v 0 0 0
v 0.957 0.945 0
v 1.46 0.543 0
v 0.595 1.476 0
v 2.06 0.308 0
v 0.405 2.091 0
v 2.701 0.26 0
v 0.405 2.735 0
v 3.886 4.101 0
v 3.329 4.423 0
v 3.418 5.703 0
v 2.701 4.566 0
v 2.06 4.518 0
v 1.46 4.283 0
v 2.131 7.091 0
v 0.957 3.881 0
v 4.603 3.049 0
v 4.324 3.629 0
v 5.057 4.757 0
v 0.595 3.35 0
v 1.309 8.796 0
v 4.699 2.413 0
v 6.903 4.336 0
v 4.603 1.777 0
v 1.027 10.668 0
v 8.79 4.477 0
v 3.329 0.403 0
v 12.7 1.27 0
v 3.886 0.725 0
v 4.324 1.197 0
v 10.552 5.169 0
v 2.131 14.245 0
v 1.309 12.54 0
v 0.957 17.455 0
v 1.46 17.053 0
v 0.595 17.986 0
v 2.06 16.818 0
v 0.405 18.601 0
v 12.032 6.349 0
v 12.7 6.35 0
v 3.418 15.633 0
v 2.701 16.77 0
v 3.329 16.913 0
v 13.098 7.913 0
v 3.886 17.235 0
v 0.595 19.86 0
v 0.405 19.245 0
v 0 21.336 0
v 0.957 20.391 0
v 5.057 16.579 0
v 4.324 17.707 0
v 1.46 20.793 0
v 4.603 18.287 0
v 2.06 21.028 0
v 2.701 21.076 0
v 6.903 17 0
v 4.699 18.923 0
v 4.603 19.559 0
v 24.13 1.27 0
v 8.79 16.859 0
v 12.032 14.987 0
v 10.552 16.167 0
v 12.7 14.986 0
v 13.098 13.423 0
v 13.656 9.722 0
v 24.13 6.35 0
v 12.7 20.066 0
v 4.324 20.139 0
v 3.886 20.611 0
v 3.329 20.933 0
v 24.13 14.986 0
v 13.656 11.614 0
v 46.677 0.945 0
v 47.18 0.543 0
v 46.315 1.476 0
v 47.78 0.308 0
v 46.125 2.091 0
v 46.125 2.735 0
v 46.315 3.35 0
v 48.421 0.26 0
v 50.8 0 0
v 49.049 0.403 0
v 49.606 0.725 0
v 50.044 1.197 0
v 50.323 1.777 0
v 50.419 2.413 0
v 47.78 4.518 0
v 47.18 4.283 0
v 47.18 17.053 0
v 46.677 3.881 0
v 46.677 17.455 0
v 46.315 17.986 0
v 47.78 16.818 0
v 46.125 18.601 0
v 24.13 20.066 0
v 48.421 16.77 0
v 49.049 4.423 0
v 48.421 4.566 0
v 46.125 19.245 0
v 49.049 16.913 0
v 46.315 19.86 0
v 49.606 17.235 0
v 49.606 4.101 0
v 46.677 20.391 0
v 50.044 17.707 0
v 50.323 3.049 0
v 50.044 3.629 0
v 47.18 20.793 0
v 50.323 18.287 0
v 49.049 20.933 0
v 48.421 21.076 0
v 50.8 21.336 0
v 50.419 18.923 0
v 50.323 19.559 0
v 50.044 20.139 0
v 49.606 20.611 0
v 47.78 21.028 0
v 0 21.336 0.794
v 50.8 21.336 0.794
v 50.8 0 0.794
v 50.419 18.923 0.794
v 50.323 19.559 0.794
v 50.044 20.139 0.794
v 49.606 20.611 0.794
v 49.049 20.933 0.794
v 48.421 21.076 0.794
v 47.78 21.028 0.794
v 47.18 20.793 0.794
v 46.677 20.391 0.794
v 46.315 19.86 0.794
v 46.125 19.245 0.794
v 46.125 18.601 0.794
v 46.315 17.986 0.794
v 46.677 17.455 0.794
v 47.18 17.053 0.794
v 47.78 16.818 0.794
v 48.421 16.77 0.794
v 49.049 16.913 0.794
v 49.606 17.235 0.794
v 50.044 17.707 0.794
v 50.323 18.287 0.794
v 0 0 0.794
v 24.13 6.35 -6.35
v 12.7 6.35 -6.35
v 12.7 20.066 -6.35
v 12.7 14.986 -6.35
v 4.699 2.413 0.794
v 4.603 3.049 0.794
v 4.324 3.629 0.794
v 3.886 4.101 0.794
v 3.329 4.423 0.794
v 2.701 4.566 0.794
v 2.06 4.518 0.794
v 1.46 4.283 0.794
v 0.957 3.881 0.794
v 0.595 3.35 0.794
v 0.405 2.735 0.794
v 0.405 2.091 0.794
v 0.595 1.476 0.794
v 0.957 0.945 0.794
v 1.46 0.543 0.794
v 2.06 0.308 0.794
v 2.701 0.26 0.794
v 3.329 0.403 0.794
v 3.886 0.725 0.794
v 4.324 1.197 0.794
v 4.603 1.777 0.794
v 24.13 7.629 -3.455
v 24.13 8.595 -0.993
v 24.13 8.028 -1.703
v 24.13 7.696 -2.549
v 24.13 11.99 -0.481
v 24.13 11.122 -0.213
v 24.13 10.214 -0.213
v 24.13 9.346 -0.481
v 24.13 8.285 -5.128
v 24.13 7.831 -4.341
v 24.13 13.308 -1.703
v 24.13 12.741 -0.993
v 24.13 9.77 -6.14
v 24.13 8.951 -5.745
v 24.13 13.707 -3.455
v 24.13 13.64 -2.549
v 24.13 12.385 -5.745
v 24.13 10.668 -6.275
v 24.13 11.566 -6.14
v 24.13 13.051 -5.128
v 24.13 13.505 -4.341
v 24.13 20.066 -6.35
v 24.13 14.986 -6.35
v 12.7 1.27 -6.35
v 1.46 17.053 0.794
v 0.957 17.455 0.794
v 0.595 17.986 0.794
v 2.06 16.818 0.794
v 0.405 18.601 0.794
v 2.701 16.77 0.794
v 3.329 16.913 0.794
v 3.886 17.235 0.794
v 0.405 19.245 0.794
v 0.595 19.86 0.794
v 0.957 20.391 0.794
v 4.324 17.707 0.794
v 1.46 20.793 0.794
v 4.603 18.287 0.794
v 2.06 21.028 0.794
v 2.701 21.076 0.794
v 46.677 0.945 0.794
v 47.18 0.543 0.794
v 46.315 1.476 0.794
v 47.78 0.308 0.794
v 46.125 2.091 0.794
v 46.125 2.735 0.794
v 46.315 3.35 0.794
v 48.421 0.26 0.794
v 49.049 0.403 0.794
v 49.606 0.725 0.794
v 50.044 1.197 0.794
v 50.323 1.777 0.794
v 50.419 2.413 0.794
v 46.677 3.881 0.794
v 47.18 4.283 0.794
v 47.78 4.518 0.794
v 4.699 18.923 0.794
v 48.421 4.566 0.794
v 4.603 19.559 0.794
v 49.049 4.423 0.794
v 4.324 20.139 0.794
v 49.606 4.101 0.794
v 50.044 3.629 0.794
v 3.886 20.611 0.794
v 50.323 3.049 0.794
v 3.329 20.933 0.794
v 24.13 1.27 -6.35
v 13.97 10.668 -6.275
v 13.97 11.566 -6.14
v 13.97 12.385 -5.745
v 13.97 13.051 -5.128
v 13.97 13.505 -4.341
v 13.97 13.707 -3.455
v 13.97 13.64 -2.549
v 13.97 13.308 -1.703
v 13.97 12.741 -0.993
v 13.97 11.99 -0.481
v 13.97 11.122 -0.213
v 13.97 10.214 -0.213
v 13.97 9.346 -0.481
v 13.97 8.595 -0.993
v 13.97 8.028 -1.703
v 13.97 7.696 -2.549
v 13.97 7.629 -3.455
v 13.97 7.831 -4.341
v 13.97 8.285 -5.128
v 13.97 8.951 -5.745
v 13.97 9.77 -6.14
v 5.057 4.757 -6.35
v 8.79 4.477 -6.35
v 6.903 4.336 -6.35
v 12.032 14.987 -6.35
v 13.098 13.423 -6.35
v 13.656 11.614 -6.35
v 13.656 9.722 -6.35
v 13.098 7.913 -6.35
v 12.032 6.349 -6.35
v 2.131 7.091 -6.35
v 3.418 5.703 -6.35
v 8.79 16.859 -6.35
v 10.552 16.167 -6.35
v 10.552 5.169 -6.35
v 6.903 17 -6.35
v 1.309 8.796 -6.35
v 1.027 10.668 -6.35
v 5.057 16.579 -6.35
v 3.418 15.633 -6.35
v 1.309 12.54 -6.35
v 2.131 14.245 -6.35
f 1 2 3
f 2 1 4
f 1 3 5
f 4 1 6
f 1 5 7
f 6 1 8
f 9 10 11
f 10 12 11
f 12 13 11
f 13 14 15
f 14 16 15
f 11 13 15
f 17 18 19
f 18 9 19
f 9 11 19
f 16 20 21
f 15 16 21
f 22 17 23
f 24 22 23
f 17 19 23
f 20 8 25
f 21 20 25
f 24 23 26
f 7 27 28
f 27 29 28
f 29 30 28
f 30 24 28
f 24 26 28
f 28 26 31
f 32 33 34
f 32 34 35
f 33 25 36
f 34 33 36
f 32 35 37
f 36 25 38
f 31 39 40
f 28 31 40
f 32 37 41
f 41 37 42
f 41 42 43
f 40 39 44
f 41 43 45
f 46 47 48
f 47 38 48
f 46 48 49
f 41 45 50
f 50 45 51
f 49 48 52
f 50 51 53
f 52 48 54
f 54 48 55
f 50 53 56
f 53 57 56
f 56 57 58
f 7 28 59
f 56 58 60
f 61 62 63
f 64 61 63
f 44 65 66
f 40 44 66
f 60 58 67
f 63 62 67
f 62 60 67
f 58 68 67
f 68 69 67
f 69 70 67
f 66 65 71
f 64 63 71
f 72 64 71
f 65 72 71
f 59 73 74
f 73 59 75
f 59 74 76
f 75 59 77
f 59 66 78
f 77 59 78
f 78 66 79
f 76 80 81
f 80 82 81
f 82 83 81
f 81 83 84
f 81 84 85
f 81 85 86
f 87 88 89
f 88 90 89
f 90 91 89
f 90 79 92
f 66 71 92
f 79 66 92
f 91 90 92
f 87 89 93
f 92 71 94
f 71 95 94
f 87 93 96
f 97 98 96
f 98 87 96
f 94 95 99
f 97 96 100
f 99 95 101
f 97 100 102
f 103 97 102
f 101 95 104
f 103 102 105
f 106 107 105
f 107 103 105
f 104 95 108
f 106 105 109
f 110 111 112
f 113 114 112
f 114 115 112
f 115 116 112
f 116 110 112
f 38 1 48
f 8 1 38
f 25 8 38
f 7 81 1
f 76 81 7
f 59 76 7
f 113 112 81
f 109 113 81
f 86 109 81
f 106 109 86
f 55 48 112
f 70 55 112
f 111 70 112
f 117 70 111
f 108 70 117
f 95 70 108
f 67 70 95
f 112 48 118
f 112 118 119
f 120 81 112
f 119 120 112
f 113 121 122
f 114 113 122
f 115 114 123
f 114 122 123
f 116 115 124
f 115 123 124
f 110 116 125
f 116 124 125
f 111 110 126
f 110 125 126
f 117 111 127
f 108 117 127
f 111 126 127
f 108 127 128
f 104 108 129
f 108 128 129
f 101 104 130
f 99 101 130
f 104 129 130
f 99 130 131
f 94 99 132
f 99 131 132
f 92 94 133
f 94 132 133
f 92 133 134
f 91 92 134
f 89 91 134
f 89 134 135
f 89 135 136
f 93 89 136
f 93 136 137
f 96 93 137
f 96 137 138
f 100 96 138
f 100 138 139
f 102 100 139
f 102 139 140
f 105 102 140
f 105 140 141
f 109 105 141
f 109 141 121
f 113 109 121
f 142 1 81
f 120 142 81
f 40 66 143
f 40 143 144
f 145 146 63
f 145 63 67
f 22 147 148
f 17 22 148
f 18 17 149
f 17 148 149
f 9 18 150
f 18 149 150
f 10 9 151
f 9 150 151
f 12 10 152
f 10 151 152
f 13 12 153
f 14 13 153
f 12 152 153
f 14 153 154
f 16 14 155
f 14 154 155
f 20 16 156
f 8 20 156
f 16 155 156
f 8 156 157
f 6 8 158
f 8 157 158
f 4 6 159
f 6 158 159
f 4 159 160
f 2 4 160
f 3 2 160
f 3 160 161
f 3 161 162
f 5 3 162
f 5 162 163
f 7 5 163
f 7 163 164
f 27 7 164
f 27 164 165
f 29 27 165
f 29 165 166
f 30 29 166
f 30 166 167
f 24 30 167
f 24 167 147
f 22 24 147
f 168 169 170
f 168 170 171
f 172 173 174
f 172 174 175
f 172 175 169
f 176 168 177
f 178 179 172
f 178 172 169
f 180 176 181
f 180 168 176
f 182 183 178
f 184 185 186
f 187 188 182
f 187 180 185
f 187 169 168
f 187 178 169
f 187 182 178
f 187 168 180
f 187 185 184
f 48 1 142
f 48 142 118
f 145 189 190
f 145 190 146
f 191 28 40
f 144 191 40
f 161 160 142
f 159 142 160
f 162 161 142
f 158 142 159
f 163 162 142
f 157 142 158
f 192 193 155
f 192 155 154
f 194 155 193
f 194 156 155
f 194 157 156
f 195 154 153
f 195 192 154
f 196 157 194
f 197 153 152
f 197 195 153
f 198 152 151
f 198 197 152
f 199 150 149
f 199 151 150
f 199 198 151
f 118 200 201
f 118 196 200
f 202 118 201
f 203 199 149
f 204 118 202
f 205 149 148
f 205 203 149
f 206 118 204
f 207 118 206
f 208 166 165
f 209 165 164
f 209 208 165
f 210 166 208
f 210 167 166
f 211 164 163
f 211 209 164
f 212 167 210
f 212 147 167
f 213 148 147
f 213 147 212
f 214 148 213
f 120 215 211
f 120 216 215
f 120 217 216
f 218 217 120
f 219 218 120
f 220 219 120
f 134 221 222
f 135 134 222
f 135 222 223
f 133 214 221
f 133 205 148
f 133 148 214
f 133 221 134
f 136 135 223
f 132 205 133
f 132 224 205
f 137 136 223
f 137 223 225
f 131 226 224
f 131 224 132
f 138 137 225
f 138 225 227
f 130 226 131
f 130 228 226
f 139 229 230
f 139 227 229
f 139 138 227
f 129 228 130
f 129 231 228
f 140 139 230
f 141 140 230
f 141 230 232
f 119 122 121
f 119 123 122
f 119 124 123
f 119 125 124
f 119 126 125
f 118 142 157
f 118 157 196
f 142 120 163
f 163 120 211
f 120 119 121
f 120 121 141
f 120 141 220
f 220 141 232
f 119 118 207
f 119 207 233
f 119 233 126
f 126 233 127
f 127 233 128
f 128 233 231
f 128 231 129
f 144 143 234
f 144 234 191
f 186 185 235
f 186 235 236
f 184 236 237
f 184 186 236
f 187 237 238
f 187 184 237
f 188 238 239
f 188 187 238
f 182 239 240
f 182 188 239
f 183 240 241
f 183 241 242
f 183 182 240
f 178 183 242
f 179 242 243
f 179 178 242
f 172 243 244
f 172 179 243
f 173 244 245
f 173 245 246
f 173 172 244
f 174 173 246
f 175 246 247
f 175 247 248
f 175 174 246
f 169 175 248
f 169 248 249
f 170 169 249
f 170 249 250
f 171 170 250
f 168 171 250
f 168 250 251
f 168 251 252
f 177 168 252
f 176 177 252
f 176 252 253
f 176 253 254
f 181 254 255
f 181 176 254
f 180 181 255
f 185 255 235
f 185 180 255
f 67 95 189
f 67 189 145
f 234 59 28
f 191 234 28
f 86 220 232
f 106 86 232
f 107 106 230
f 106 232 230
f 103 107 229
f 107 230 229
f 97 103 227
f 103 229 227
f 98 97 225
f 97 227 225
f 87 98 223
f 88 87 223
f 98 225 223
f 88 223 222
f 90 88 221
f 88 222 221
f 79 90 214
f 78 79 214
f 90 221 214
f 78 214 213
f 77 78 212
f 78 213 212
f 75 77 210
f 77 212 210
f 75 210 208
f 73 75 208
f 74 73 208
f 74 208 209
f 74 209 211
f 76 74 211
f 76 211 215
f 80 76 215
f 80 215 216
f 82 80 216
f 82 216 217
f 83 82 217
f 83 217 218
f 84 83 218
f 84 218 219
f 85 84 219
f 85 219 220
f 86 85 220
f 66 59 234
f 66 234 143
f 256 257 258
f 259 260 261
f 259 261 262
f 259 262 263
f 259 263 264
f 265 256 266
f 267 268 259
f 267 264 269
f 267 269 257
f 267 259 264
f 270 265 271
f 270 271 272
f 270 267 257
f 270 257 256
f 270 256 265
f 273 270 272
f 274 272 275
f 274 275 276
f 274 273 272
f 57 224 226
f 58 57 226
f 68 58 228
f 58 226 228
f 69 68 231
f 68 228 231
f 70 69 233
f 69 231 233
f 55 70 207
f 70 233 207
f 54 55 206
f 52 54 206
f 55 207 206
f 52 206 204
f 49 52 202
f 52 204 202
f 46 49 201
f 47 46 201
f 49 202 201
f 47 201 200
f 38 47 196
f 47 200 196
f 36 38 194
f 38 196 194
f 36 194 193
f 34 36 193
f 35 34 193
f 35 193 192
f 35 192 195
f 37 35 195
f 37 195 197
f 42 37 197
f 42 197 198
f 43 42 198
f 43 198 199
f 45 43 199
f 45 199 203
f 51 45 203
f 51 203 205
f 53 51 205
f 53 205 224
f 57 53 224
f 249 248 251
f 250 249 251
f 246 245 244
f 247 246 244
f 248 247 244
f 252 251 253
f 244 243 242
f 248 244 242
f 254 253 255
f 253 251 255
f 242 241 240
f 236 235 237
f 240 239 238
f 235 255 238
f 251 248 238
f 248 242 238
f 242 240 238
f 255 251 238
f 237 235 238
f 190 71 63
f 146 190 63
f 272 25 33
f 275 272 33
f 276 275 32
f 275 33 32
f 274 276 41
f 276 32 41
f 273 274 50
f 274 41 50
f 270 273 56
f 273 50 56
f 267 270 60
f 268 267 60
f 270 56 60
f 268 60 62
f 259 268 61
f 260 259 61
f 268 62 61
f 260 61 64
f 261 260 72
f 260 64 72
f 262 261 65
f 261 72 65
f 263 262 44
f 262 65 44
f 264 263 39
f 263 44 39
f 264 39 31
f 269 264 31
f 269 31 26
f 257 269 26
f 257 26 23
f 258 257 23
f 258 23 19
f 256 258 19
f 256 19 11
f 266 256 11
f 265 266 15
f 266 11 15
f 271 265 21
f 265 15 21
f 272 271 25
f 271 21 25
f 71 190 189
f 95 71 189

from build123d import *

# Parameters (mm, degrees)
SKETCH1_W           = 50.8
SKETCH1_H           = 21.336
BOSS_EXTRUDE1_DEPTH = 0.79375
SKETCH2_R           = 2.159
CUT_EXTRUDE1_DEPTH  = 56.104400324
SKETCH3_R           = 6.35
SKETCH3_W           = 11.43
SKETCH3_H           = 5.08
BOSS_EXTRUDE2_DEPTH = 6.35
SKETCH4_R           = 3.048
BOSS_EXTRUDE3_DEPTH = 10.16


with BuildPart() as part:
    # Sketch1 → Boss-Extrude1 (new body)
    with BuildSketch(Plane.XY):
        with Locations((25.4, 10.668)):
            Rectangle(SKETCH1_W, SKETCH1_H)
    extrude(amount=BOSS_EXTRUDE1_DEPTH)

    # Sketch2 → Cut-Extrude1 (cut, through all)
    with BuildSketch(Plane.XY.offset(0.79375)):
        with Locations((2.54, 18.923)):
            Circle(SKETCH2_R)
        with Locations((2.54, 2.413)):
            Circle(SKETCH2_R)
        with Locations((48.26, 2.413)):
            Circle(SKETCH2_R)
        with Locations((48.26, 18.923)):
            Circle(SKETCH2_R)
    extrude(amount=-CUT_EXTRUDE1_DEPTH, mode=Mode.SUBTRACT)

    # Sketch3 → Boss-Extrude2 (add)
    with BuildSketch(Plane(origin=(0, 0, 0), x_dir=(-1, 0, 0), z_dir=(0, 0, -1))):
        with Locations((-7.377120002, 10.668)):
            Circle(SKETCH3_R)
        with Locations((-18.415, 17.526)):
            Rectangle(SKETCH3_W, SKETCH3_H)
        with Locations((-18.415, 3.81)):
            Rectangle(SKETCH3_W, SKETCH3_H)
    extrude(amount=BOSS_EXTRUDE2_DEPTH)


with BuildPart() as body_2:
    # Sketch4 → Boss-Extrude3 (new body)
    with BuildSketch(Plane(origin=(24.13, 0, 0), x_dir=(0, 0, -1), z_dir=(1, 0, 0))):
        with Locations((3.227106746, 10.668)):
            Circle(SKETCH4_R)
    extrude(amount=-BOSS_EXTRUDE3_DEPTH)


solid = Compound([part.part, body_2.part])
